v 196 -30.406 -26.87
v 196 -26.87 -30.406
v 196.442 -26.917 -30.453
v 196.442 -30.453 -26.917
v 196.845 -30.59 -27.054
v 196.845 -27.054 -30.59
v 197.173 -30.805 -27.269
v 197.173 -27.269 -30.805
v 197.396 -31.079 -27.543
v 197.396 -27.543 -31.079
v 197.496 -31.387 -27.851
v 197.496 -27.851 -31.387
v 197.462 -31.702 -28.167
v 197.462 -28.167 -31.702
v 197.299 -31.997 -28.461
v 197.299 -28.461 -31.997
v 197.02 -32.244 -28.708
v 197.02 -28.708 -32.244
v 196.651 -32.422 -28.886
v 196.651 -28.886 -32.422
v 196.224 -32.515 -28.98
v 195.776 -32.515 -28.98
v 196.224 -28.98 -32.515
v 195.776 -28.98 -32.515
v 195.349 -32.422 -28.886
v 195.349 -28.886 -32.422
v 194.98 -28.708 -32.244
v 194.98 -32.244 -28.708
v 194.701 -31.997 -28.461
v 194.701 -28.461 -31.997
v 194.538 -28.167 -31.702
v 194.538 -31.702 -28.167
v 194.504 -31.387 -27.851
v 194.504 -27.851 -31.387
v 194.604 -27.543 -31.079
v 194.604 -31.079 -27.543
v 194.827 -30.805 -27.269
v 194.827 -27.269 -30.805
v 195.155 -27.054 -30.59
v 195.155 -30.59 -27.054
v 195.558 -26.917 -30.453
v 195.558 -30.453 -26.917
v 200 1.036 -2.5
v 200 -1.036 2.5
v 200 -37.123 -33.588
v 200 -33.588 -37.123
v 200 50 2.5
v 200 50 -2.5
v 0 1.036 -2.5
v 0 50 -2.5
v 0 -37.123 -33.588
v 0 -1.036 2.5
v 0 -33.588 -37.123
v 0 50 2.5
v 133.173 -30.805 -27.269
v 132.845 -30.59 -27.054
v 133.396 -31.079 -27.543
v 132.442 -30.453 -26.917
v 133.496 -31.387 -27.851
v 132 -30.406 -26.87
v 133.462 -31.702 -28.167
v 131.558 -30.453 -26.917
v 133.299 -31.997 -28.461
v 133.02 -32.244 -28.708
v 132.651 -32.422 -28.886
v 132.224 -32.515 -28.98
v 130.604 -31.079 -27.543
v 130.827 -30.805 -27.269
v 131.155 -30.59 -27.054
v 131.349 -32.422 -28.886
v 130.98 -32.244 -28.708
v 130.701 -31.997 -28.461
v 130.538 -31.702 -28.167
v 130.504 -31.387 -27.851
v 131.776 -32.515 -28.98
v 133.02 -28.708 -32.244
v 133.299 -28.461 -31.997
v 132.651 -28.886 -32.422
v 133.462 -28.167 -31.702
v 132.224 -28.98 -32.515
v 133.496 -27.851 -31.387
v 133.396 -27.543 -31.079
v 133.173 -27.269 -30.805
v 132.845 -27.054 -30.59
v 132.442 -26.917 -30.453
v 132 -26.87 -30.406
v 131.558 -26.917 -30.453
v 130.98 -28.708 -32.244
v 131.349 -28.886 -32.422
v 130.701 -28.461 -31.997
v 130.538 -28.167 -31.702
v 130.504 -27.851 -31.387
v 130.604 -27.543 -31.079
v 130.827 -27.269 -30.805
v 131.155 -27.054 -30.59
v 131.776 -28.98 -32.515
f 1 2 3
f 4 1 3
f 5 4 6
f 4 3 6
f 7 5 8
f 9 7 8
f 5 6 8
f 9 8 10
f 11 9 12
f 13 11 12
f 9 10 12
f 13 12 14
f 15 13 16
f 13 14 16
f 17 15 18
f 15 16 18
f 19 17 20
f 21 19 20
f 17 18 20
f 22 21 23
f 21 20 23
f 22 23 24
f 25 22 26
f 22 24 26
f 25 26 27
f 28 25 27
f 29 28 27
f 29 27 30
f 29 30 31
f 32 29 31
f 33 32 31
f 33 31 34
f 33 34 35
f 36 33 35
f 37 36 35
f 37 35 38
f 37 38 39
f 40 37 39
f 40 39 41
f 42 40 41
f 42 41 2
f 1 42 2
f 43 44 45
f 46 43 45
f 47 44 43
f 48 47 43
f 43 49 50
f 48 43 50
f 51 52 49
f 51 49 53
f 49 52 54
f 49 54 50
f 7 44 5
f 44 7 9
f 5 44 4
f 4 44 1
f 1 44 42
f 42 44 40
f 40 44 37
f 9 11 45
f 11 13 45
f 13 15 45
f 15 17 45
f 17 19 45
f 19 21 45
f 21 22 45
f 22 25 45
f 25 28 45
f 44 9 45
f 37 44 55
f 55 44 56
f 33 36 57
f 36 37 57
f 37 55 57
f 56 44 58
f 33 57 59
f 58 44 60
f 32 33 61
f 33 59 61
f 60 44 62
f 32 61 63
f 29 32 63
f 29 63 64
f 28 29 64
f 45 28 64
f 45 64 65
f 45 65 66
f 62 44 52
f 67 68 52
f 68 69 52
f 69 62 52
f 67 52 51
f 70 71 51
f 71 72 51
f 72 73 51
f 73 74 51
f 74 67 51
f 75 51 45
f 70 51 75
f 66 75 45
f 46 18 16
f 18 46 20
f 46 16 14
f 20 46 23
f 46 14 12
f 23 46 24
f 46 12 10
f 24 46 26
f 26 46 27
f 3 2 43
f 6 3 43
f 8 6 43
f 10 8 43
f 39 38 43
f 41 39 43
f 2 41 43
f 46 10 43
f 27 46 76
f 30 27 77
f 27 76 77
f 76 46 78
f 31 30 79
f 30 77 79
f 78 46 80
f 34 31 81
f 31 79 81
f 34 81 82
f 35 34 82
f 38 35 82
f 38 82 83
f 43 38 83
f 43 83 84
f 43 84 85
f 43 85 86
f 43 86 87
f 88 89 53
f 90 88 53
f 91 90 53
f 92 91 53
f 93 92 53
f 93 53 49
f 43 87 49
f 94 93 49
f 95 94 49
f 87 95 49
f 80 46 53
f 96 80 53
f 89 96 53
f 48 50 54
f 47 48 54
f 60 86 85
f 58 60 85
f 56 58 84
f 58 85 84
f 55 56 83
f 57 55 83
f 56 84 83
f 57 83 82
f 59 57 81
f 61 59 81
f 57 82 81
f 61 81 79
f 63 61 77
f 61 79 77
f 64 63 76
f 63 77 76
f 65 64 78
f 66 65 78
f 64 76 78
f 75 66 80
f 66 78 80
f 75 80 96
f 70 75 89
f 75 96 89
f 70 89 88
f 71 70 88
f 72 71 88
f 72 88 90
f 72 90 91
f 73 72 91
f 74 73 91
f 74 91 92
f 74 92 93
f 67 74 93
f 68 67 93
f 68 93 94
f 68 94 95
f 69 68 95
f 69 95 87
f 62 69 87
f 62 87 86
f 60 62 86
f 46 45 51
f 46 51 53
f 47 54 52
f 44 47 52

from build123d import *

# Parameters (mm, degrees)
EXTRUDE_THIN1_DEPTH = 200
CUT_EXTRUDE1_REACH  = 210.749
SKETCH3_R           = 1.5


with BuildPart() as part:
    # Sketch2 → Extrude-Thin1 (new body)
    with BuildSketch(Plane(origin=(0, 0, 0), x_dir=(0, 0, -1), z_dir=(1, 0, 0))):
        Polygon((-2.5, 50), (-2.5, -1.035533906), (33.587572106, -37.123106012), (37.123106012, -33.587572106), (2.5, 1.035533906), (2.5, 50), align=None)
    extrude(amount=EXTRUDE_THIN1_DEPTH)

    # Sketch3 → Cut-Extrude1 (cut, up to next)
    with BuildSketch(Plane(origin=(0, 1.767766953, -1.767766953), x_dir=(1, 0, 0), z_dir=(0, 0.7071067811865489, -0.7071067811865462)), mode=Mode.PRIVATE) as cut_extrude1_sk1:
        with Locations(Location((132, 42, 0), (0, 0, 270))):
            Circle(SKETCH3_R)
    cut_extrude1_tool1 = extrude(cut_extrude1_sk1.sketch, amount=-CUT_EXTRUDE1_REACH, mode=Mode.PRIVATE) & part.part
    # Sketch3 → Cut-Extrude1 (cut, up to next)
    with BuildSketch(Plane(origin=(0, 1.767766953, -1.767766953), x_dir=(1, 0, 0), z_dir=(0, 0.7071067811865489, -0.7071067811865462)), mode=Mode.PRIVATE) as cut_extrude1_sk2:
        with Locations(Location((196, 42, 0), (0, 0, 270))):
            Circle(SKETCH3_R)
    cut_extrude1_tool2 = extrude(cut_extrude1_sk2.sketch, amount=-CUT_EXTRUDE1_REACH, mode=Mode.PRIVATE) & part.part
    add(cut_extrude1_tool1.solids().sort_by_distance((132, -27.930718, -31.466252))[0], mode=Mode.SUBTRACT)
    add(cut_extrude1_tool2.solids().sort_by_distance((196, -27.930718, -31.466252))[0], mode=Mode.SUBTRACT)


solid = part.part
